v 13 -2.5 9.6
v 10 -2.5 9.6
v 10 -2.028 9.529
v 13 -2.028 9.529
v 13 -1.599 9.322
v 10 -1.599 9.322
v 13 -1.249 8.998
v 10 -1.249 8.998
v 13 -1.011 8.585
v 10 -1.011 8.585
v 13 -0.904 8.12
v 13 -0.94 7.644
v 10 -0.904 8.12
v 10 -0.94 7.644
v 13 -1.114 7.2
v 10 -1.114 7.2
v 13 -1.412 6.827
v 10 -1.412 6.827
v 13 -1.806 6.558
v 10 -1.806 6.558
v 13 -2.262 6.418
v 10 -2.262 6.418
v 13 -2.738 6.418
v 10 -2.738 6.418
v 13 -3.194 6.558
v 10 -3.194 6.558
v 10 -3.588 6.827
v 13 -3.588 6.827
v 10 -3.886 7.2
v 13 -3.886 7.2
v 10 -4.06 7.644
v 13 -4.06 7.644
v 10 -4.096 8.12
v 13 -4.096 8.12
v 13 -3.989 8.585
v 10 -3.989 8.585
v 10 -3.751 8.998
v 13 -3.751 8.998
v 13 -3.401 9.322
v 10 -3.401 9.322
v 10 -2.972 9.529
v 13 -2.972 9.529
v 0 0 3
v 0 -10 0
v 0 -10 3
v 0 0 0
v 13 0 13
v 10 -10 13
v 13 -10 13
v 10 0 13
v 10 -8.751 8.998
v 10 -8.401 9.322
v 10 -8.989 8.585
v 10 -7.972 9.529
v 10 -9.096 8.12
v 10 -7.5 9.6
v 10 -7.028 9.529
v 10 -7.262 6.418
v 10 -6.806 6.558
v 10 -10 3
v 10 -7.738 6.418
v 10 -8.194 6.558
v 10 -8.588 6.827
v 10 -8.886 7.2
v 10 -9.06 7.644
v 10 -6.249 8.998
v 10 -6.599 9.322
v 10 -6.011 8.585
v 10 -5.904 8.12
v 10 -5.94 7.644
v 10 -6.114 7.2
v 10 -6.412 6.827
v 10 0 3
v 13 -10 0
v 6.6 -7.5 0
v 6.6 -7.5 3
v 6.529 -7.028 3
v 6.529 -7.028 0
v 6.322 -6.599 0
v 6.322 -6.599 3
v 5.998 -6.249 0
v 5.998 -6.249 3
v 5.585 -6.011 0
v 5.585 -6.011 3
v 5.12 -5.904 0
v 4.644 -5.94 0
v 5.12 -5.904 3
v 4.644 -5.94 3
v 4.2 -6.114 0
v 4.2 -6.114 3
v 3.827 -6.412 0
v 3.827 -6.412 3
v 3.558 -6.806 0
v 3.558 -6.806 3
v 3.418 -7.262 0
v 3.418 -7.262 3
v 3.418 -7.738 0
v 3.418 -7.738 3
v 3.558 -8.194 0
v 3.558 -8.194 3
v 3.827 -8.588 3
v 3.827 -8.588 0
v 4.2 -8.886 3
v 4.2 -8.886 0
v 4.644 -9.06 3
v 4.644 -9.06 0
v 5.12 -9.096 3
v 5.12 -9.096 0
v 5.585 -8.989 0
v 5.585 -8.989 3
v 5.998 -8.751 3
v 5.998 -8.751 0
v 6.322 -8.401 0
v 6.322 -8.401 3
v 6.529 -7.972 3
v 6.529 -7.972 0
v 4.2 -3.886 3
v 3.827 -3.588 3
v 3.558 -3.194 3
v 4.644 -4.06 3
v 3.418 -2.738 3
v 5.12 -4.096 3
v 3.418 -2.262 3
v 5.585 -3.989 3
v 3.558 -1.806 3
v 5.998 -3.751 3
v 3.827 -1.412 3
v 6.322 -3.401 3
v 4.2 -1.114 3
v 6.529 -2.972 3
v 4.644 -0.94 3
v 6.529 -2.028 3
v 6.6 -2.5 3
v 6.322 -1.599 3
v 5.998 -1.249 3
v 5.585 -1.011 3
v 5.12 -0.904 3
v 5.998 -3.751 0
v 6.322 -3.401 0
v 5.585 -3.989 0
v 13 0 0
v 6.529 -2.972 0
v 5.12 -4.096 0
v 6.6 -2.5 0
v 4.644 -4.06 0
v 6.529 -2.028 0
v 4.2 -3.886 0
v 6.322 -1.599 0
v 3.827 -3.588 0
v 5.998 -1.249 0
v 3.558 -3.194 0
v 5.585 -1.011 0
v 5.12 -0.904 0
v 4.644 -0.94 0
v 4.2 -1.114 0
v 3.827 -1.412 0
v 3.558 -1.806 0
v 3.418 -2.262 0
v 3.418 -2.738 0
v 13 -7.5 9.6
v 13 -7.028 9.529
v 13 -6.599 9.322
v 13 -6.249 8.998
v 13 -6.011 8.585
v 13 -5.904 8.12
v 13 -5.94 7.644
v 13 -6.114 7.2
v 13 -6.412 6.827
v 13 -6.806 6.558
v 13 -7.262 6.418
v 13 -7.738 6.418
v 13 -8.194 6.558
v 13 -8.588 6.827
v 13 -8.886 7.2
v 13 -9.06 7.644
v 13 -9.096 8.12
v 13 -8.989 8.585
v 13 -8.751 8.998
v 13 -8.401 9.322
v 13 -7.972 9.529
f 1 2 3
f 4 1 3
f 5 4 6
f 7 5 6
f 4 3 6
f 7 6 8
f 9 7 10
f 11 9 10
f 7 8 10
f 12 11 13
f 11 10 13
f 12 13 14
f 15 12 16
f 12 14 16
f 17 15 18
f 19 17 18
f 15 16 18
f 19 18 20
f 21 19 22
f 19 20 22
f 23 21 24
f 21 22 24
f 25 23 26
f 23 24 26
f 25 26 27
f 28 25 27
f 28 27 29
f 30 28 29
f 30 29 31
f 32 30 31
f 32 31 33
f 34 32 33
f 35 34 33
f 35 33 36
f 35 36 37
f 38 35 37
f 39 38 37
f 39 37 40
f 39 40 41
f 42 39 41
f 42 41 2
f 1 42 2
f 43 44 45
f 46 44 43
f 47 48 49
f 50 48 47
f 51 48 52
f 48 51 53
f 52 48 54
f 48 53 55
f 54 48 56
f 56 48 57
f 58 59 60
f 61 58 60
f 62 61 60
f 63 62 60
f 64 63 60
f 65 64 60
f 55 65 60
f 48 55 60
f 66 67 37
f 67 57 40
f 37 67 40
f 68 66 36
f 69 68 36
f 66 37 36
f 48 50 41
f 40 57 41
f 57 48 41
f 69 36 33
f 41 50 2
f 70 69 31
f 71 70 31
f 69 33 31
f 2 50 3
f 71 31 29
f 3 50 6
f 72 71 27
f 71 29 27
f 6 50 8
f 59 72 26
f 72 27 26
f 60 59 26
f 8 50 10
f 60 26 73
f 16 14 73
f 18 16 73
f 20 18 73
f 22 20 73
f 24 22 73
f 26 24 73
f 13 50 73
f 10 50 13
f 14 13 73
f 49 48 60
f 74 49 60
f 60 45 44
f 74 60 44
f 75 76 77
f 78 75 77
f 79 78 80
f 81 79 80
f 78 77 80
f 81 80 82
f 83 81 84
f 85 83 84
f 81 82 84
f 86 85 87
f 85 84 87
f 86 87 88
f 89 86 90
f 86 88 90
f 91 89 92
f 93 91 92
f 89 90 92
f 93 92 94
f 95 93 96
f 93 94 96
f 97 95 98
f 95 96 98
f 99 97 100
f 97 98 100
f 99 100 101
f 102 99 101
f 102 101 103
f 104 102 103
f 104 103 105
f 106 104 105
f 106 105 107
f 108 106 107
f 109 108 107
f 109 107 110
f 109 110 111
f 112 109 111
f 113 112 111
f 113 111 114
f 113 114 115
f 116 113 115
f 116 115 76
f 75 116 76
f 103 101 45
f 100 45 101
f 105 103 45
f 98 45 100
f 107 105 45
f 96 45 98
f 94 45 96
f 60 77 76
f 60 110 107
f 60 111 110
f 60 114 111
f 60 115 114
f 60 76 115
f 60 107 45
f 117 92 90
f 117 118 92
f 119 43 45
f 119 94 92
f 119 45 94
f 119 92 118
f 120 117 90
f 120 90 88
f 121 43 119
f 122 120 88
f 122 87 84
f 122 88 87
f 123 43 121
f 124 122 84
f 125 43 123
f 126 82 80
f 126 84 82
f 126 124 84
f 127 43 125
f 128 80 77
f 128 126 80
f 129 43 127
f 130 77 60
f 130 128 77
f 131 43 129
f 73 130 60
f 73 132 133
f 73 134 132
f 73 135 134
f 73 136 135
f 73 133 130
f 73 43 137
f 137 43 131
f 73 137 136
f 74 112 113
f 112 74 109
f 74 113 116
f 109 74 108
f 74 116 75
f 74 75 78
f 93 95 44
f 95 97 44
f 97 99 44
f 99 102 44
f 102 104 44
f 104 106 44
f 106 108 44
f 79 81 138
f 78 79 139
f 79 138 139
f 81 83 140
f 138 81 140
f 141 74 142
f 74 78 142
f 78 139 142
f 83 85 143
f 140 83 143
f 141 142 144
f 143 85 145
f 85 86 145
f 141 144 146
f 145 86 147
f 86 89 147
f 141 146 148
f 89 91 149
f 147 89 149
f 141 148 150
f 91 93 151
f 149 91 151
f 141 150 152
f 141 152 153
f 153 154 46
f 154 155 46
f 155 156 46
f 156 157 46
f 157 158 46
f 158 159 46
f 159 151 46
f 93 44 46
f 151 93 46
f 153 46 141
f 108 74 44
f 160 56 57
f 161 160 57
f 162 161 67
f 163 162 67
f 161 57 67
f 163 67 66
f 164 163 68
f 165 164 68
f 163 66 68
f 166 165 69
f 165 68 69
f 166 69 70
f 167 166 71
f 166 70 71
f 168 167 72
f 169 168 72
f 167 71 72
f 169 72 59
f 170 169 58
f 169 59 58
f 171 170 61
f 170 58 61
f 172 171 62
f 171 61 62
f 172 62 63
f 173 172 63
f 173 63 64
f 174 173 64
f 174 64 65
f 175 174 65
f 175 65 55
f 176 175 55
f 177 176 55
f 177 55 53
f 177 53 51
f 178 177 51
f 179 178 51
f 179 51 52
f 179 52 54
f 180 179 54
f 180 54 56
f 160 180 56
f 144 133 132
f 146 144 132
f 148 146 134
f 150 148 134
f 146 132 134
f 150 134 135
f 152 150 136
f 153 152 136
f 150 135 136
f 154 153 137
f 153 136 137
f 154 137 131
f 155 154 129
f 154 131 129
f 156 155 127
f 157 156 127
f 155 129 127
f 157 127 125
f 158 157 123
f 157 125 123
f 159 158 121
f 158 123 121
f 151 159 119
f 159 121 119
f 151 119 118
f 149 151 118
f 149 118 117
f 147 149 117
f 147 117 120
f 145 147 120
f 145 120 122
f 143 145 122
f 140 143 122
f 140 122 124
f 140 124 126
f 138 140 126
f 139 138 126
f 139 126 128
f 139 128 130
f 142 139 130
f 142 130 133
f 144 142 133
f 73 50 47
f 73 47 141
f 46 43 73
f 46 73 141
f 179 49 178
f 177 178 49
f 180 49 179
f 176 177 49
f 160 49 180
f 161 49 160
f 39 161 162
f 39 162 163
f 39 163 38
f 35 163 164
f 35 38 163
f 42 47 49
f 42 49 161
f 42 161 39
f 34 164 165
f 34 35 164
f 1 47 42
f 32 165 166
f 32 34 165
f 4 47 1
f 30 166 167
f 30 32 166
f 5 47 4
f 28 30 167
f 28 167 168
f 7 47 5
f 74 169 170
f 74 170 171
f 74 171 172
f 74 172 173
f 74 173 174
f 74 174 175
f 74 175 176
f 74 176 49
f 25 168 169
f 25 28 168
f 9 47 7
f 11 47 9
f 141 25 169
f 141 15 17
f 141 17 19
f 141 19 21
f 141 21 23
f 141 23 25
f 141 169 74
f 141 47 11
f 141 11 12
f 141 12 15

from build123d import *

# Parameters (mm, degrees)
SKETCH1_W           = 10
SKETCH1_H           = 10
BOSS_EXTRUDE1_DEPTH = 3
SKETCH2_W           = 13
SKETCH2_H           = 10
BOSS_EXTRUDE2_DEPTH = 3
SKETCH3_R           = 1.6
CUT_EXTRUDE1_DEPTH  = 4
SKETCH4_R           = 1.6
CUT_EXTRUDE2_DEPTH  = 4


with BuildPart() as part:
    # Sketch1 → Boss-Extrude1 (new body)
    with BuildSketch(Plane.XY):
        with Locations((5, -5)):
            Rectangle(SKETCH1_W, SKETCH1_H)
    extrude(amount=BOSS_EXTRUDE1_DEPTH)

    # Sketch2 → Boss-Extrude2 (add)
    with BuildSketch(Plane(origin=(10, 0, 0), x_dir=(0, 0, -1), z_dir=(1, 0, 0))):
        with Locations((-6.5, -5)):
            Rectangle(SKETCH2_W, SKETCH2_H)
    extrude(amount=BOSS_EXTRUDE2_DEPTH)

    # Sketch3 → Cut-Extrude1 (cut, through all)
    with BuildSketch(Plane.XY.offset(3)):
        with Locations((5, -2.5)):
            Circle(SKETCH3_R)
        with Locations((5, -7.5)):
            Circle(SKETCH3_R)
    extrude(amount=-CUT_EXTRUDE1_DEPTH, mode=Mode.SUBTRACT)

    # Sketch4 → Cut-Extrude2 (cut, through all)
    with BuildSketch(Plane.ZY.offset(-10)):
        with Locations((8, -2.5)):
            Circle(SKETCH4_R)
        with Locations((8, -7.5)):
            Circle(SKETCH4_R)
    extrude(amount=-CUT_EXTRUDE2_DEPTH, mode=Mode.SUBTRACT)


solid = part.part
